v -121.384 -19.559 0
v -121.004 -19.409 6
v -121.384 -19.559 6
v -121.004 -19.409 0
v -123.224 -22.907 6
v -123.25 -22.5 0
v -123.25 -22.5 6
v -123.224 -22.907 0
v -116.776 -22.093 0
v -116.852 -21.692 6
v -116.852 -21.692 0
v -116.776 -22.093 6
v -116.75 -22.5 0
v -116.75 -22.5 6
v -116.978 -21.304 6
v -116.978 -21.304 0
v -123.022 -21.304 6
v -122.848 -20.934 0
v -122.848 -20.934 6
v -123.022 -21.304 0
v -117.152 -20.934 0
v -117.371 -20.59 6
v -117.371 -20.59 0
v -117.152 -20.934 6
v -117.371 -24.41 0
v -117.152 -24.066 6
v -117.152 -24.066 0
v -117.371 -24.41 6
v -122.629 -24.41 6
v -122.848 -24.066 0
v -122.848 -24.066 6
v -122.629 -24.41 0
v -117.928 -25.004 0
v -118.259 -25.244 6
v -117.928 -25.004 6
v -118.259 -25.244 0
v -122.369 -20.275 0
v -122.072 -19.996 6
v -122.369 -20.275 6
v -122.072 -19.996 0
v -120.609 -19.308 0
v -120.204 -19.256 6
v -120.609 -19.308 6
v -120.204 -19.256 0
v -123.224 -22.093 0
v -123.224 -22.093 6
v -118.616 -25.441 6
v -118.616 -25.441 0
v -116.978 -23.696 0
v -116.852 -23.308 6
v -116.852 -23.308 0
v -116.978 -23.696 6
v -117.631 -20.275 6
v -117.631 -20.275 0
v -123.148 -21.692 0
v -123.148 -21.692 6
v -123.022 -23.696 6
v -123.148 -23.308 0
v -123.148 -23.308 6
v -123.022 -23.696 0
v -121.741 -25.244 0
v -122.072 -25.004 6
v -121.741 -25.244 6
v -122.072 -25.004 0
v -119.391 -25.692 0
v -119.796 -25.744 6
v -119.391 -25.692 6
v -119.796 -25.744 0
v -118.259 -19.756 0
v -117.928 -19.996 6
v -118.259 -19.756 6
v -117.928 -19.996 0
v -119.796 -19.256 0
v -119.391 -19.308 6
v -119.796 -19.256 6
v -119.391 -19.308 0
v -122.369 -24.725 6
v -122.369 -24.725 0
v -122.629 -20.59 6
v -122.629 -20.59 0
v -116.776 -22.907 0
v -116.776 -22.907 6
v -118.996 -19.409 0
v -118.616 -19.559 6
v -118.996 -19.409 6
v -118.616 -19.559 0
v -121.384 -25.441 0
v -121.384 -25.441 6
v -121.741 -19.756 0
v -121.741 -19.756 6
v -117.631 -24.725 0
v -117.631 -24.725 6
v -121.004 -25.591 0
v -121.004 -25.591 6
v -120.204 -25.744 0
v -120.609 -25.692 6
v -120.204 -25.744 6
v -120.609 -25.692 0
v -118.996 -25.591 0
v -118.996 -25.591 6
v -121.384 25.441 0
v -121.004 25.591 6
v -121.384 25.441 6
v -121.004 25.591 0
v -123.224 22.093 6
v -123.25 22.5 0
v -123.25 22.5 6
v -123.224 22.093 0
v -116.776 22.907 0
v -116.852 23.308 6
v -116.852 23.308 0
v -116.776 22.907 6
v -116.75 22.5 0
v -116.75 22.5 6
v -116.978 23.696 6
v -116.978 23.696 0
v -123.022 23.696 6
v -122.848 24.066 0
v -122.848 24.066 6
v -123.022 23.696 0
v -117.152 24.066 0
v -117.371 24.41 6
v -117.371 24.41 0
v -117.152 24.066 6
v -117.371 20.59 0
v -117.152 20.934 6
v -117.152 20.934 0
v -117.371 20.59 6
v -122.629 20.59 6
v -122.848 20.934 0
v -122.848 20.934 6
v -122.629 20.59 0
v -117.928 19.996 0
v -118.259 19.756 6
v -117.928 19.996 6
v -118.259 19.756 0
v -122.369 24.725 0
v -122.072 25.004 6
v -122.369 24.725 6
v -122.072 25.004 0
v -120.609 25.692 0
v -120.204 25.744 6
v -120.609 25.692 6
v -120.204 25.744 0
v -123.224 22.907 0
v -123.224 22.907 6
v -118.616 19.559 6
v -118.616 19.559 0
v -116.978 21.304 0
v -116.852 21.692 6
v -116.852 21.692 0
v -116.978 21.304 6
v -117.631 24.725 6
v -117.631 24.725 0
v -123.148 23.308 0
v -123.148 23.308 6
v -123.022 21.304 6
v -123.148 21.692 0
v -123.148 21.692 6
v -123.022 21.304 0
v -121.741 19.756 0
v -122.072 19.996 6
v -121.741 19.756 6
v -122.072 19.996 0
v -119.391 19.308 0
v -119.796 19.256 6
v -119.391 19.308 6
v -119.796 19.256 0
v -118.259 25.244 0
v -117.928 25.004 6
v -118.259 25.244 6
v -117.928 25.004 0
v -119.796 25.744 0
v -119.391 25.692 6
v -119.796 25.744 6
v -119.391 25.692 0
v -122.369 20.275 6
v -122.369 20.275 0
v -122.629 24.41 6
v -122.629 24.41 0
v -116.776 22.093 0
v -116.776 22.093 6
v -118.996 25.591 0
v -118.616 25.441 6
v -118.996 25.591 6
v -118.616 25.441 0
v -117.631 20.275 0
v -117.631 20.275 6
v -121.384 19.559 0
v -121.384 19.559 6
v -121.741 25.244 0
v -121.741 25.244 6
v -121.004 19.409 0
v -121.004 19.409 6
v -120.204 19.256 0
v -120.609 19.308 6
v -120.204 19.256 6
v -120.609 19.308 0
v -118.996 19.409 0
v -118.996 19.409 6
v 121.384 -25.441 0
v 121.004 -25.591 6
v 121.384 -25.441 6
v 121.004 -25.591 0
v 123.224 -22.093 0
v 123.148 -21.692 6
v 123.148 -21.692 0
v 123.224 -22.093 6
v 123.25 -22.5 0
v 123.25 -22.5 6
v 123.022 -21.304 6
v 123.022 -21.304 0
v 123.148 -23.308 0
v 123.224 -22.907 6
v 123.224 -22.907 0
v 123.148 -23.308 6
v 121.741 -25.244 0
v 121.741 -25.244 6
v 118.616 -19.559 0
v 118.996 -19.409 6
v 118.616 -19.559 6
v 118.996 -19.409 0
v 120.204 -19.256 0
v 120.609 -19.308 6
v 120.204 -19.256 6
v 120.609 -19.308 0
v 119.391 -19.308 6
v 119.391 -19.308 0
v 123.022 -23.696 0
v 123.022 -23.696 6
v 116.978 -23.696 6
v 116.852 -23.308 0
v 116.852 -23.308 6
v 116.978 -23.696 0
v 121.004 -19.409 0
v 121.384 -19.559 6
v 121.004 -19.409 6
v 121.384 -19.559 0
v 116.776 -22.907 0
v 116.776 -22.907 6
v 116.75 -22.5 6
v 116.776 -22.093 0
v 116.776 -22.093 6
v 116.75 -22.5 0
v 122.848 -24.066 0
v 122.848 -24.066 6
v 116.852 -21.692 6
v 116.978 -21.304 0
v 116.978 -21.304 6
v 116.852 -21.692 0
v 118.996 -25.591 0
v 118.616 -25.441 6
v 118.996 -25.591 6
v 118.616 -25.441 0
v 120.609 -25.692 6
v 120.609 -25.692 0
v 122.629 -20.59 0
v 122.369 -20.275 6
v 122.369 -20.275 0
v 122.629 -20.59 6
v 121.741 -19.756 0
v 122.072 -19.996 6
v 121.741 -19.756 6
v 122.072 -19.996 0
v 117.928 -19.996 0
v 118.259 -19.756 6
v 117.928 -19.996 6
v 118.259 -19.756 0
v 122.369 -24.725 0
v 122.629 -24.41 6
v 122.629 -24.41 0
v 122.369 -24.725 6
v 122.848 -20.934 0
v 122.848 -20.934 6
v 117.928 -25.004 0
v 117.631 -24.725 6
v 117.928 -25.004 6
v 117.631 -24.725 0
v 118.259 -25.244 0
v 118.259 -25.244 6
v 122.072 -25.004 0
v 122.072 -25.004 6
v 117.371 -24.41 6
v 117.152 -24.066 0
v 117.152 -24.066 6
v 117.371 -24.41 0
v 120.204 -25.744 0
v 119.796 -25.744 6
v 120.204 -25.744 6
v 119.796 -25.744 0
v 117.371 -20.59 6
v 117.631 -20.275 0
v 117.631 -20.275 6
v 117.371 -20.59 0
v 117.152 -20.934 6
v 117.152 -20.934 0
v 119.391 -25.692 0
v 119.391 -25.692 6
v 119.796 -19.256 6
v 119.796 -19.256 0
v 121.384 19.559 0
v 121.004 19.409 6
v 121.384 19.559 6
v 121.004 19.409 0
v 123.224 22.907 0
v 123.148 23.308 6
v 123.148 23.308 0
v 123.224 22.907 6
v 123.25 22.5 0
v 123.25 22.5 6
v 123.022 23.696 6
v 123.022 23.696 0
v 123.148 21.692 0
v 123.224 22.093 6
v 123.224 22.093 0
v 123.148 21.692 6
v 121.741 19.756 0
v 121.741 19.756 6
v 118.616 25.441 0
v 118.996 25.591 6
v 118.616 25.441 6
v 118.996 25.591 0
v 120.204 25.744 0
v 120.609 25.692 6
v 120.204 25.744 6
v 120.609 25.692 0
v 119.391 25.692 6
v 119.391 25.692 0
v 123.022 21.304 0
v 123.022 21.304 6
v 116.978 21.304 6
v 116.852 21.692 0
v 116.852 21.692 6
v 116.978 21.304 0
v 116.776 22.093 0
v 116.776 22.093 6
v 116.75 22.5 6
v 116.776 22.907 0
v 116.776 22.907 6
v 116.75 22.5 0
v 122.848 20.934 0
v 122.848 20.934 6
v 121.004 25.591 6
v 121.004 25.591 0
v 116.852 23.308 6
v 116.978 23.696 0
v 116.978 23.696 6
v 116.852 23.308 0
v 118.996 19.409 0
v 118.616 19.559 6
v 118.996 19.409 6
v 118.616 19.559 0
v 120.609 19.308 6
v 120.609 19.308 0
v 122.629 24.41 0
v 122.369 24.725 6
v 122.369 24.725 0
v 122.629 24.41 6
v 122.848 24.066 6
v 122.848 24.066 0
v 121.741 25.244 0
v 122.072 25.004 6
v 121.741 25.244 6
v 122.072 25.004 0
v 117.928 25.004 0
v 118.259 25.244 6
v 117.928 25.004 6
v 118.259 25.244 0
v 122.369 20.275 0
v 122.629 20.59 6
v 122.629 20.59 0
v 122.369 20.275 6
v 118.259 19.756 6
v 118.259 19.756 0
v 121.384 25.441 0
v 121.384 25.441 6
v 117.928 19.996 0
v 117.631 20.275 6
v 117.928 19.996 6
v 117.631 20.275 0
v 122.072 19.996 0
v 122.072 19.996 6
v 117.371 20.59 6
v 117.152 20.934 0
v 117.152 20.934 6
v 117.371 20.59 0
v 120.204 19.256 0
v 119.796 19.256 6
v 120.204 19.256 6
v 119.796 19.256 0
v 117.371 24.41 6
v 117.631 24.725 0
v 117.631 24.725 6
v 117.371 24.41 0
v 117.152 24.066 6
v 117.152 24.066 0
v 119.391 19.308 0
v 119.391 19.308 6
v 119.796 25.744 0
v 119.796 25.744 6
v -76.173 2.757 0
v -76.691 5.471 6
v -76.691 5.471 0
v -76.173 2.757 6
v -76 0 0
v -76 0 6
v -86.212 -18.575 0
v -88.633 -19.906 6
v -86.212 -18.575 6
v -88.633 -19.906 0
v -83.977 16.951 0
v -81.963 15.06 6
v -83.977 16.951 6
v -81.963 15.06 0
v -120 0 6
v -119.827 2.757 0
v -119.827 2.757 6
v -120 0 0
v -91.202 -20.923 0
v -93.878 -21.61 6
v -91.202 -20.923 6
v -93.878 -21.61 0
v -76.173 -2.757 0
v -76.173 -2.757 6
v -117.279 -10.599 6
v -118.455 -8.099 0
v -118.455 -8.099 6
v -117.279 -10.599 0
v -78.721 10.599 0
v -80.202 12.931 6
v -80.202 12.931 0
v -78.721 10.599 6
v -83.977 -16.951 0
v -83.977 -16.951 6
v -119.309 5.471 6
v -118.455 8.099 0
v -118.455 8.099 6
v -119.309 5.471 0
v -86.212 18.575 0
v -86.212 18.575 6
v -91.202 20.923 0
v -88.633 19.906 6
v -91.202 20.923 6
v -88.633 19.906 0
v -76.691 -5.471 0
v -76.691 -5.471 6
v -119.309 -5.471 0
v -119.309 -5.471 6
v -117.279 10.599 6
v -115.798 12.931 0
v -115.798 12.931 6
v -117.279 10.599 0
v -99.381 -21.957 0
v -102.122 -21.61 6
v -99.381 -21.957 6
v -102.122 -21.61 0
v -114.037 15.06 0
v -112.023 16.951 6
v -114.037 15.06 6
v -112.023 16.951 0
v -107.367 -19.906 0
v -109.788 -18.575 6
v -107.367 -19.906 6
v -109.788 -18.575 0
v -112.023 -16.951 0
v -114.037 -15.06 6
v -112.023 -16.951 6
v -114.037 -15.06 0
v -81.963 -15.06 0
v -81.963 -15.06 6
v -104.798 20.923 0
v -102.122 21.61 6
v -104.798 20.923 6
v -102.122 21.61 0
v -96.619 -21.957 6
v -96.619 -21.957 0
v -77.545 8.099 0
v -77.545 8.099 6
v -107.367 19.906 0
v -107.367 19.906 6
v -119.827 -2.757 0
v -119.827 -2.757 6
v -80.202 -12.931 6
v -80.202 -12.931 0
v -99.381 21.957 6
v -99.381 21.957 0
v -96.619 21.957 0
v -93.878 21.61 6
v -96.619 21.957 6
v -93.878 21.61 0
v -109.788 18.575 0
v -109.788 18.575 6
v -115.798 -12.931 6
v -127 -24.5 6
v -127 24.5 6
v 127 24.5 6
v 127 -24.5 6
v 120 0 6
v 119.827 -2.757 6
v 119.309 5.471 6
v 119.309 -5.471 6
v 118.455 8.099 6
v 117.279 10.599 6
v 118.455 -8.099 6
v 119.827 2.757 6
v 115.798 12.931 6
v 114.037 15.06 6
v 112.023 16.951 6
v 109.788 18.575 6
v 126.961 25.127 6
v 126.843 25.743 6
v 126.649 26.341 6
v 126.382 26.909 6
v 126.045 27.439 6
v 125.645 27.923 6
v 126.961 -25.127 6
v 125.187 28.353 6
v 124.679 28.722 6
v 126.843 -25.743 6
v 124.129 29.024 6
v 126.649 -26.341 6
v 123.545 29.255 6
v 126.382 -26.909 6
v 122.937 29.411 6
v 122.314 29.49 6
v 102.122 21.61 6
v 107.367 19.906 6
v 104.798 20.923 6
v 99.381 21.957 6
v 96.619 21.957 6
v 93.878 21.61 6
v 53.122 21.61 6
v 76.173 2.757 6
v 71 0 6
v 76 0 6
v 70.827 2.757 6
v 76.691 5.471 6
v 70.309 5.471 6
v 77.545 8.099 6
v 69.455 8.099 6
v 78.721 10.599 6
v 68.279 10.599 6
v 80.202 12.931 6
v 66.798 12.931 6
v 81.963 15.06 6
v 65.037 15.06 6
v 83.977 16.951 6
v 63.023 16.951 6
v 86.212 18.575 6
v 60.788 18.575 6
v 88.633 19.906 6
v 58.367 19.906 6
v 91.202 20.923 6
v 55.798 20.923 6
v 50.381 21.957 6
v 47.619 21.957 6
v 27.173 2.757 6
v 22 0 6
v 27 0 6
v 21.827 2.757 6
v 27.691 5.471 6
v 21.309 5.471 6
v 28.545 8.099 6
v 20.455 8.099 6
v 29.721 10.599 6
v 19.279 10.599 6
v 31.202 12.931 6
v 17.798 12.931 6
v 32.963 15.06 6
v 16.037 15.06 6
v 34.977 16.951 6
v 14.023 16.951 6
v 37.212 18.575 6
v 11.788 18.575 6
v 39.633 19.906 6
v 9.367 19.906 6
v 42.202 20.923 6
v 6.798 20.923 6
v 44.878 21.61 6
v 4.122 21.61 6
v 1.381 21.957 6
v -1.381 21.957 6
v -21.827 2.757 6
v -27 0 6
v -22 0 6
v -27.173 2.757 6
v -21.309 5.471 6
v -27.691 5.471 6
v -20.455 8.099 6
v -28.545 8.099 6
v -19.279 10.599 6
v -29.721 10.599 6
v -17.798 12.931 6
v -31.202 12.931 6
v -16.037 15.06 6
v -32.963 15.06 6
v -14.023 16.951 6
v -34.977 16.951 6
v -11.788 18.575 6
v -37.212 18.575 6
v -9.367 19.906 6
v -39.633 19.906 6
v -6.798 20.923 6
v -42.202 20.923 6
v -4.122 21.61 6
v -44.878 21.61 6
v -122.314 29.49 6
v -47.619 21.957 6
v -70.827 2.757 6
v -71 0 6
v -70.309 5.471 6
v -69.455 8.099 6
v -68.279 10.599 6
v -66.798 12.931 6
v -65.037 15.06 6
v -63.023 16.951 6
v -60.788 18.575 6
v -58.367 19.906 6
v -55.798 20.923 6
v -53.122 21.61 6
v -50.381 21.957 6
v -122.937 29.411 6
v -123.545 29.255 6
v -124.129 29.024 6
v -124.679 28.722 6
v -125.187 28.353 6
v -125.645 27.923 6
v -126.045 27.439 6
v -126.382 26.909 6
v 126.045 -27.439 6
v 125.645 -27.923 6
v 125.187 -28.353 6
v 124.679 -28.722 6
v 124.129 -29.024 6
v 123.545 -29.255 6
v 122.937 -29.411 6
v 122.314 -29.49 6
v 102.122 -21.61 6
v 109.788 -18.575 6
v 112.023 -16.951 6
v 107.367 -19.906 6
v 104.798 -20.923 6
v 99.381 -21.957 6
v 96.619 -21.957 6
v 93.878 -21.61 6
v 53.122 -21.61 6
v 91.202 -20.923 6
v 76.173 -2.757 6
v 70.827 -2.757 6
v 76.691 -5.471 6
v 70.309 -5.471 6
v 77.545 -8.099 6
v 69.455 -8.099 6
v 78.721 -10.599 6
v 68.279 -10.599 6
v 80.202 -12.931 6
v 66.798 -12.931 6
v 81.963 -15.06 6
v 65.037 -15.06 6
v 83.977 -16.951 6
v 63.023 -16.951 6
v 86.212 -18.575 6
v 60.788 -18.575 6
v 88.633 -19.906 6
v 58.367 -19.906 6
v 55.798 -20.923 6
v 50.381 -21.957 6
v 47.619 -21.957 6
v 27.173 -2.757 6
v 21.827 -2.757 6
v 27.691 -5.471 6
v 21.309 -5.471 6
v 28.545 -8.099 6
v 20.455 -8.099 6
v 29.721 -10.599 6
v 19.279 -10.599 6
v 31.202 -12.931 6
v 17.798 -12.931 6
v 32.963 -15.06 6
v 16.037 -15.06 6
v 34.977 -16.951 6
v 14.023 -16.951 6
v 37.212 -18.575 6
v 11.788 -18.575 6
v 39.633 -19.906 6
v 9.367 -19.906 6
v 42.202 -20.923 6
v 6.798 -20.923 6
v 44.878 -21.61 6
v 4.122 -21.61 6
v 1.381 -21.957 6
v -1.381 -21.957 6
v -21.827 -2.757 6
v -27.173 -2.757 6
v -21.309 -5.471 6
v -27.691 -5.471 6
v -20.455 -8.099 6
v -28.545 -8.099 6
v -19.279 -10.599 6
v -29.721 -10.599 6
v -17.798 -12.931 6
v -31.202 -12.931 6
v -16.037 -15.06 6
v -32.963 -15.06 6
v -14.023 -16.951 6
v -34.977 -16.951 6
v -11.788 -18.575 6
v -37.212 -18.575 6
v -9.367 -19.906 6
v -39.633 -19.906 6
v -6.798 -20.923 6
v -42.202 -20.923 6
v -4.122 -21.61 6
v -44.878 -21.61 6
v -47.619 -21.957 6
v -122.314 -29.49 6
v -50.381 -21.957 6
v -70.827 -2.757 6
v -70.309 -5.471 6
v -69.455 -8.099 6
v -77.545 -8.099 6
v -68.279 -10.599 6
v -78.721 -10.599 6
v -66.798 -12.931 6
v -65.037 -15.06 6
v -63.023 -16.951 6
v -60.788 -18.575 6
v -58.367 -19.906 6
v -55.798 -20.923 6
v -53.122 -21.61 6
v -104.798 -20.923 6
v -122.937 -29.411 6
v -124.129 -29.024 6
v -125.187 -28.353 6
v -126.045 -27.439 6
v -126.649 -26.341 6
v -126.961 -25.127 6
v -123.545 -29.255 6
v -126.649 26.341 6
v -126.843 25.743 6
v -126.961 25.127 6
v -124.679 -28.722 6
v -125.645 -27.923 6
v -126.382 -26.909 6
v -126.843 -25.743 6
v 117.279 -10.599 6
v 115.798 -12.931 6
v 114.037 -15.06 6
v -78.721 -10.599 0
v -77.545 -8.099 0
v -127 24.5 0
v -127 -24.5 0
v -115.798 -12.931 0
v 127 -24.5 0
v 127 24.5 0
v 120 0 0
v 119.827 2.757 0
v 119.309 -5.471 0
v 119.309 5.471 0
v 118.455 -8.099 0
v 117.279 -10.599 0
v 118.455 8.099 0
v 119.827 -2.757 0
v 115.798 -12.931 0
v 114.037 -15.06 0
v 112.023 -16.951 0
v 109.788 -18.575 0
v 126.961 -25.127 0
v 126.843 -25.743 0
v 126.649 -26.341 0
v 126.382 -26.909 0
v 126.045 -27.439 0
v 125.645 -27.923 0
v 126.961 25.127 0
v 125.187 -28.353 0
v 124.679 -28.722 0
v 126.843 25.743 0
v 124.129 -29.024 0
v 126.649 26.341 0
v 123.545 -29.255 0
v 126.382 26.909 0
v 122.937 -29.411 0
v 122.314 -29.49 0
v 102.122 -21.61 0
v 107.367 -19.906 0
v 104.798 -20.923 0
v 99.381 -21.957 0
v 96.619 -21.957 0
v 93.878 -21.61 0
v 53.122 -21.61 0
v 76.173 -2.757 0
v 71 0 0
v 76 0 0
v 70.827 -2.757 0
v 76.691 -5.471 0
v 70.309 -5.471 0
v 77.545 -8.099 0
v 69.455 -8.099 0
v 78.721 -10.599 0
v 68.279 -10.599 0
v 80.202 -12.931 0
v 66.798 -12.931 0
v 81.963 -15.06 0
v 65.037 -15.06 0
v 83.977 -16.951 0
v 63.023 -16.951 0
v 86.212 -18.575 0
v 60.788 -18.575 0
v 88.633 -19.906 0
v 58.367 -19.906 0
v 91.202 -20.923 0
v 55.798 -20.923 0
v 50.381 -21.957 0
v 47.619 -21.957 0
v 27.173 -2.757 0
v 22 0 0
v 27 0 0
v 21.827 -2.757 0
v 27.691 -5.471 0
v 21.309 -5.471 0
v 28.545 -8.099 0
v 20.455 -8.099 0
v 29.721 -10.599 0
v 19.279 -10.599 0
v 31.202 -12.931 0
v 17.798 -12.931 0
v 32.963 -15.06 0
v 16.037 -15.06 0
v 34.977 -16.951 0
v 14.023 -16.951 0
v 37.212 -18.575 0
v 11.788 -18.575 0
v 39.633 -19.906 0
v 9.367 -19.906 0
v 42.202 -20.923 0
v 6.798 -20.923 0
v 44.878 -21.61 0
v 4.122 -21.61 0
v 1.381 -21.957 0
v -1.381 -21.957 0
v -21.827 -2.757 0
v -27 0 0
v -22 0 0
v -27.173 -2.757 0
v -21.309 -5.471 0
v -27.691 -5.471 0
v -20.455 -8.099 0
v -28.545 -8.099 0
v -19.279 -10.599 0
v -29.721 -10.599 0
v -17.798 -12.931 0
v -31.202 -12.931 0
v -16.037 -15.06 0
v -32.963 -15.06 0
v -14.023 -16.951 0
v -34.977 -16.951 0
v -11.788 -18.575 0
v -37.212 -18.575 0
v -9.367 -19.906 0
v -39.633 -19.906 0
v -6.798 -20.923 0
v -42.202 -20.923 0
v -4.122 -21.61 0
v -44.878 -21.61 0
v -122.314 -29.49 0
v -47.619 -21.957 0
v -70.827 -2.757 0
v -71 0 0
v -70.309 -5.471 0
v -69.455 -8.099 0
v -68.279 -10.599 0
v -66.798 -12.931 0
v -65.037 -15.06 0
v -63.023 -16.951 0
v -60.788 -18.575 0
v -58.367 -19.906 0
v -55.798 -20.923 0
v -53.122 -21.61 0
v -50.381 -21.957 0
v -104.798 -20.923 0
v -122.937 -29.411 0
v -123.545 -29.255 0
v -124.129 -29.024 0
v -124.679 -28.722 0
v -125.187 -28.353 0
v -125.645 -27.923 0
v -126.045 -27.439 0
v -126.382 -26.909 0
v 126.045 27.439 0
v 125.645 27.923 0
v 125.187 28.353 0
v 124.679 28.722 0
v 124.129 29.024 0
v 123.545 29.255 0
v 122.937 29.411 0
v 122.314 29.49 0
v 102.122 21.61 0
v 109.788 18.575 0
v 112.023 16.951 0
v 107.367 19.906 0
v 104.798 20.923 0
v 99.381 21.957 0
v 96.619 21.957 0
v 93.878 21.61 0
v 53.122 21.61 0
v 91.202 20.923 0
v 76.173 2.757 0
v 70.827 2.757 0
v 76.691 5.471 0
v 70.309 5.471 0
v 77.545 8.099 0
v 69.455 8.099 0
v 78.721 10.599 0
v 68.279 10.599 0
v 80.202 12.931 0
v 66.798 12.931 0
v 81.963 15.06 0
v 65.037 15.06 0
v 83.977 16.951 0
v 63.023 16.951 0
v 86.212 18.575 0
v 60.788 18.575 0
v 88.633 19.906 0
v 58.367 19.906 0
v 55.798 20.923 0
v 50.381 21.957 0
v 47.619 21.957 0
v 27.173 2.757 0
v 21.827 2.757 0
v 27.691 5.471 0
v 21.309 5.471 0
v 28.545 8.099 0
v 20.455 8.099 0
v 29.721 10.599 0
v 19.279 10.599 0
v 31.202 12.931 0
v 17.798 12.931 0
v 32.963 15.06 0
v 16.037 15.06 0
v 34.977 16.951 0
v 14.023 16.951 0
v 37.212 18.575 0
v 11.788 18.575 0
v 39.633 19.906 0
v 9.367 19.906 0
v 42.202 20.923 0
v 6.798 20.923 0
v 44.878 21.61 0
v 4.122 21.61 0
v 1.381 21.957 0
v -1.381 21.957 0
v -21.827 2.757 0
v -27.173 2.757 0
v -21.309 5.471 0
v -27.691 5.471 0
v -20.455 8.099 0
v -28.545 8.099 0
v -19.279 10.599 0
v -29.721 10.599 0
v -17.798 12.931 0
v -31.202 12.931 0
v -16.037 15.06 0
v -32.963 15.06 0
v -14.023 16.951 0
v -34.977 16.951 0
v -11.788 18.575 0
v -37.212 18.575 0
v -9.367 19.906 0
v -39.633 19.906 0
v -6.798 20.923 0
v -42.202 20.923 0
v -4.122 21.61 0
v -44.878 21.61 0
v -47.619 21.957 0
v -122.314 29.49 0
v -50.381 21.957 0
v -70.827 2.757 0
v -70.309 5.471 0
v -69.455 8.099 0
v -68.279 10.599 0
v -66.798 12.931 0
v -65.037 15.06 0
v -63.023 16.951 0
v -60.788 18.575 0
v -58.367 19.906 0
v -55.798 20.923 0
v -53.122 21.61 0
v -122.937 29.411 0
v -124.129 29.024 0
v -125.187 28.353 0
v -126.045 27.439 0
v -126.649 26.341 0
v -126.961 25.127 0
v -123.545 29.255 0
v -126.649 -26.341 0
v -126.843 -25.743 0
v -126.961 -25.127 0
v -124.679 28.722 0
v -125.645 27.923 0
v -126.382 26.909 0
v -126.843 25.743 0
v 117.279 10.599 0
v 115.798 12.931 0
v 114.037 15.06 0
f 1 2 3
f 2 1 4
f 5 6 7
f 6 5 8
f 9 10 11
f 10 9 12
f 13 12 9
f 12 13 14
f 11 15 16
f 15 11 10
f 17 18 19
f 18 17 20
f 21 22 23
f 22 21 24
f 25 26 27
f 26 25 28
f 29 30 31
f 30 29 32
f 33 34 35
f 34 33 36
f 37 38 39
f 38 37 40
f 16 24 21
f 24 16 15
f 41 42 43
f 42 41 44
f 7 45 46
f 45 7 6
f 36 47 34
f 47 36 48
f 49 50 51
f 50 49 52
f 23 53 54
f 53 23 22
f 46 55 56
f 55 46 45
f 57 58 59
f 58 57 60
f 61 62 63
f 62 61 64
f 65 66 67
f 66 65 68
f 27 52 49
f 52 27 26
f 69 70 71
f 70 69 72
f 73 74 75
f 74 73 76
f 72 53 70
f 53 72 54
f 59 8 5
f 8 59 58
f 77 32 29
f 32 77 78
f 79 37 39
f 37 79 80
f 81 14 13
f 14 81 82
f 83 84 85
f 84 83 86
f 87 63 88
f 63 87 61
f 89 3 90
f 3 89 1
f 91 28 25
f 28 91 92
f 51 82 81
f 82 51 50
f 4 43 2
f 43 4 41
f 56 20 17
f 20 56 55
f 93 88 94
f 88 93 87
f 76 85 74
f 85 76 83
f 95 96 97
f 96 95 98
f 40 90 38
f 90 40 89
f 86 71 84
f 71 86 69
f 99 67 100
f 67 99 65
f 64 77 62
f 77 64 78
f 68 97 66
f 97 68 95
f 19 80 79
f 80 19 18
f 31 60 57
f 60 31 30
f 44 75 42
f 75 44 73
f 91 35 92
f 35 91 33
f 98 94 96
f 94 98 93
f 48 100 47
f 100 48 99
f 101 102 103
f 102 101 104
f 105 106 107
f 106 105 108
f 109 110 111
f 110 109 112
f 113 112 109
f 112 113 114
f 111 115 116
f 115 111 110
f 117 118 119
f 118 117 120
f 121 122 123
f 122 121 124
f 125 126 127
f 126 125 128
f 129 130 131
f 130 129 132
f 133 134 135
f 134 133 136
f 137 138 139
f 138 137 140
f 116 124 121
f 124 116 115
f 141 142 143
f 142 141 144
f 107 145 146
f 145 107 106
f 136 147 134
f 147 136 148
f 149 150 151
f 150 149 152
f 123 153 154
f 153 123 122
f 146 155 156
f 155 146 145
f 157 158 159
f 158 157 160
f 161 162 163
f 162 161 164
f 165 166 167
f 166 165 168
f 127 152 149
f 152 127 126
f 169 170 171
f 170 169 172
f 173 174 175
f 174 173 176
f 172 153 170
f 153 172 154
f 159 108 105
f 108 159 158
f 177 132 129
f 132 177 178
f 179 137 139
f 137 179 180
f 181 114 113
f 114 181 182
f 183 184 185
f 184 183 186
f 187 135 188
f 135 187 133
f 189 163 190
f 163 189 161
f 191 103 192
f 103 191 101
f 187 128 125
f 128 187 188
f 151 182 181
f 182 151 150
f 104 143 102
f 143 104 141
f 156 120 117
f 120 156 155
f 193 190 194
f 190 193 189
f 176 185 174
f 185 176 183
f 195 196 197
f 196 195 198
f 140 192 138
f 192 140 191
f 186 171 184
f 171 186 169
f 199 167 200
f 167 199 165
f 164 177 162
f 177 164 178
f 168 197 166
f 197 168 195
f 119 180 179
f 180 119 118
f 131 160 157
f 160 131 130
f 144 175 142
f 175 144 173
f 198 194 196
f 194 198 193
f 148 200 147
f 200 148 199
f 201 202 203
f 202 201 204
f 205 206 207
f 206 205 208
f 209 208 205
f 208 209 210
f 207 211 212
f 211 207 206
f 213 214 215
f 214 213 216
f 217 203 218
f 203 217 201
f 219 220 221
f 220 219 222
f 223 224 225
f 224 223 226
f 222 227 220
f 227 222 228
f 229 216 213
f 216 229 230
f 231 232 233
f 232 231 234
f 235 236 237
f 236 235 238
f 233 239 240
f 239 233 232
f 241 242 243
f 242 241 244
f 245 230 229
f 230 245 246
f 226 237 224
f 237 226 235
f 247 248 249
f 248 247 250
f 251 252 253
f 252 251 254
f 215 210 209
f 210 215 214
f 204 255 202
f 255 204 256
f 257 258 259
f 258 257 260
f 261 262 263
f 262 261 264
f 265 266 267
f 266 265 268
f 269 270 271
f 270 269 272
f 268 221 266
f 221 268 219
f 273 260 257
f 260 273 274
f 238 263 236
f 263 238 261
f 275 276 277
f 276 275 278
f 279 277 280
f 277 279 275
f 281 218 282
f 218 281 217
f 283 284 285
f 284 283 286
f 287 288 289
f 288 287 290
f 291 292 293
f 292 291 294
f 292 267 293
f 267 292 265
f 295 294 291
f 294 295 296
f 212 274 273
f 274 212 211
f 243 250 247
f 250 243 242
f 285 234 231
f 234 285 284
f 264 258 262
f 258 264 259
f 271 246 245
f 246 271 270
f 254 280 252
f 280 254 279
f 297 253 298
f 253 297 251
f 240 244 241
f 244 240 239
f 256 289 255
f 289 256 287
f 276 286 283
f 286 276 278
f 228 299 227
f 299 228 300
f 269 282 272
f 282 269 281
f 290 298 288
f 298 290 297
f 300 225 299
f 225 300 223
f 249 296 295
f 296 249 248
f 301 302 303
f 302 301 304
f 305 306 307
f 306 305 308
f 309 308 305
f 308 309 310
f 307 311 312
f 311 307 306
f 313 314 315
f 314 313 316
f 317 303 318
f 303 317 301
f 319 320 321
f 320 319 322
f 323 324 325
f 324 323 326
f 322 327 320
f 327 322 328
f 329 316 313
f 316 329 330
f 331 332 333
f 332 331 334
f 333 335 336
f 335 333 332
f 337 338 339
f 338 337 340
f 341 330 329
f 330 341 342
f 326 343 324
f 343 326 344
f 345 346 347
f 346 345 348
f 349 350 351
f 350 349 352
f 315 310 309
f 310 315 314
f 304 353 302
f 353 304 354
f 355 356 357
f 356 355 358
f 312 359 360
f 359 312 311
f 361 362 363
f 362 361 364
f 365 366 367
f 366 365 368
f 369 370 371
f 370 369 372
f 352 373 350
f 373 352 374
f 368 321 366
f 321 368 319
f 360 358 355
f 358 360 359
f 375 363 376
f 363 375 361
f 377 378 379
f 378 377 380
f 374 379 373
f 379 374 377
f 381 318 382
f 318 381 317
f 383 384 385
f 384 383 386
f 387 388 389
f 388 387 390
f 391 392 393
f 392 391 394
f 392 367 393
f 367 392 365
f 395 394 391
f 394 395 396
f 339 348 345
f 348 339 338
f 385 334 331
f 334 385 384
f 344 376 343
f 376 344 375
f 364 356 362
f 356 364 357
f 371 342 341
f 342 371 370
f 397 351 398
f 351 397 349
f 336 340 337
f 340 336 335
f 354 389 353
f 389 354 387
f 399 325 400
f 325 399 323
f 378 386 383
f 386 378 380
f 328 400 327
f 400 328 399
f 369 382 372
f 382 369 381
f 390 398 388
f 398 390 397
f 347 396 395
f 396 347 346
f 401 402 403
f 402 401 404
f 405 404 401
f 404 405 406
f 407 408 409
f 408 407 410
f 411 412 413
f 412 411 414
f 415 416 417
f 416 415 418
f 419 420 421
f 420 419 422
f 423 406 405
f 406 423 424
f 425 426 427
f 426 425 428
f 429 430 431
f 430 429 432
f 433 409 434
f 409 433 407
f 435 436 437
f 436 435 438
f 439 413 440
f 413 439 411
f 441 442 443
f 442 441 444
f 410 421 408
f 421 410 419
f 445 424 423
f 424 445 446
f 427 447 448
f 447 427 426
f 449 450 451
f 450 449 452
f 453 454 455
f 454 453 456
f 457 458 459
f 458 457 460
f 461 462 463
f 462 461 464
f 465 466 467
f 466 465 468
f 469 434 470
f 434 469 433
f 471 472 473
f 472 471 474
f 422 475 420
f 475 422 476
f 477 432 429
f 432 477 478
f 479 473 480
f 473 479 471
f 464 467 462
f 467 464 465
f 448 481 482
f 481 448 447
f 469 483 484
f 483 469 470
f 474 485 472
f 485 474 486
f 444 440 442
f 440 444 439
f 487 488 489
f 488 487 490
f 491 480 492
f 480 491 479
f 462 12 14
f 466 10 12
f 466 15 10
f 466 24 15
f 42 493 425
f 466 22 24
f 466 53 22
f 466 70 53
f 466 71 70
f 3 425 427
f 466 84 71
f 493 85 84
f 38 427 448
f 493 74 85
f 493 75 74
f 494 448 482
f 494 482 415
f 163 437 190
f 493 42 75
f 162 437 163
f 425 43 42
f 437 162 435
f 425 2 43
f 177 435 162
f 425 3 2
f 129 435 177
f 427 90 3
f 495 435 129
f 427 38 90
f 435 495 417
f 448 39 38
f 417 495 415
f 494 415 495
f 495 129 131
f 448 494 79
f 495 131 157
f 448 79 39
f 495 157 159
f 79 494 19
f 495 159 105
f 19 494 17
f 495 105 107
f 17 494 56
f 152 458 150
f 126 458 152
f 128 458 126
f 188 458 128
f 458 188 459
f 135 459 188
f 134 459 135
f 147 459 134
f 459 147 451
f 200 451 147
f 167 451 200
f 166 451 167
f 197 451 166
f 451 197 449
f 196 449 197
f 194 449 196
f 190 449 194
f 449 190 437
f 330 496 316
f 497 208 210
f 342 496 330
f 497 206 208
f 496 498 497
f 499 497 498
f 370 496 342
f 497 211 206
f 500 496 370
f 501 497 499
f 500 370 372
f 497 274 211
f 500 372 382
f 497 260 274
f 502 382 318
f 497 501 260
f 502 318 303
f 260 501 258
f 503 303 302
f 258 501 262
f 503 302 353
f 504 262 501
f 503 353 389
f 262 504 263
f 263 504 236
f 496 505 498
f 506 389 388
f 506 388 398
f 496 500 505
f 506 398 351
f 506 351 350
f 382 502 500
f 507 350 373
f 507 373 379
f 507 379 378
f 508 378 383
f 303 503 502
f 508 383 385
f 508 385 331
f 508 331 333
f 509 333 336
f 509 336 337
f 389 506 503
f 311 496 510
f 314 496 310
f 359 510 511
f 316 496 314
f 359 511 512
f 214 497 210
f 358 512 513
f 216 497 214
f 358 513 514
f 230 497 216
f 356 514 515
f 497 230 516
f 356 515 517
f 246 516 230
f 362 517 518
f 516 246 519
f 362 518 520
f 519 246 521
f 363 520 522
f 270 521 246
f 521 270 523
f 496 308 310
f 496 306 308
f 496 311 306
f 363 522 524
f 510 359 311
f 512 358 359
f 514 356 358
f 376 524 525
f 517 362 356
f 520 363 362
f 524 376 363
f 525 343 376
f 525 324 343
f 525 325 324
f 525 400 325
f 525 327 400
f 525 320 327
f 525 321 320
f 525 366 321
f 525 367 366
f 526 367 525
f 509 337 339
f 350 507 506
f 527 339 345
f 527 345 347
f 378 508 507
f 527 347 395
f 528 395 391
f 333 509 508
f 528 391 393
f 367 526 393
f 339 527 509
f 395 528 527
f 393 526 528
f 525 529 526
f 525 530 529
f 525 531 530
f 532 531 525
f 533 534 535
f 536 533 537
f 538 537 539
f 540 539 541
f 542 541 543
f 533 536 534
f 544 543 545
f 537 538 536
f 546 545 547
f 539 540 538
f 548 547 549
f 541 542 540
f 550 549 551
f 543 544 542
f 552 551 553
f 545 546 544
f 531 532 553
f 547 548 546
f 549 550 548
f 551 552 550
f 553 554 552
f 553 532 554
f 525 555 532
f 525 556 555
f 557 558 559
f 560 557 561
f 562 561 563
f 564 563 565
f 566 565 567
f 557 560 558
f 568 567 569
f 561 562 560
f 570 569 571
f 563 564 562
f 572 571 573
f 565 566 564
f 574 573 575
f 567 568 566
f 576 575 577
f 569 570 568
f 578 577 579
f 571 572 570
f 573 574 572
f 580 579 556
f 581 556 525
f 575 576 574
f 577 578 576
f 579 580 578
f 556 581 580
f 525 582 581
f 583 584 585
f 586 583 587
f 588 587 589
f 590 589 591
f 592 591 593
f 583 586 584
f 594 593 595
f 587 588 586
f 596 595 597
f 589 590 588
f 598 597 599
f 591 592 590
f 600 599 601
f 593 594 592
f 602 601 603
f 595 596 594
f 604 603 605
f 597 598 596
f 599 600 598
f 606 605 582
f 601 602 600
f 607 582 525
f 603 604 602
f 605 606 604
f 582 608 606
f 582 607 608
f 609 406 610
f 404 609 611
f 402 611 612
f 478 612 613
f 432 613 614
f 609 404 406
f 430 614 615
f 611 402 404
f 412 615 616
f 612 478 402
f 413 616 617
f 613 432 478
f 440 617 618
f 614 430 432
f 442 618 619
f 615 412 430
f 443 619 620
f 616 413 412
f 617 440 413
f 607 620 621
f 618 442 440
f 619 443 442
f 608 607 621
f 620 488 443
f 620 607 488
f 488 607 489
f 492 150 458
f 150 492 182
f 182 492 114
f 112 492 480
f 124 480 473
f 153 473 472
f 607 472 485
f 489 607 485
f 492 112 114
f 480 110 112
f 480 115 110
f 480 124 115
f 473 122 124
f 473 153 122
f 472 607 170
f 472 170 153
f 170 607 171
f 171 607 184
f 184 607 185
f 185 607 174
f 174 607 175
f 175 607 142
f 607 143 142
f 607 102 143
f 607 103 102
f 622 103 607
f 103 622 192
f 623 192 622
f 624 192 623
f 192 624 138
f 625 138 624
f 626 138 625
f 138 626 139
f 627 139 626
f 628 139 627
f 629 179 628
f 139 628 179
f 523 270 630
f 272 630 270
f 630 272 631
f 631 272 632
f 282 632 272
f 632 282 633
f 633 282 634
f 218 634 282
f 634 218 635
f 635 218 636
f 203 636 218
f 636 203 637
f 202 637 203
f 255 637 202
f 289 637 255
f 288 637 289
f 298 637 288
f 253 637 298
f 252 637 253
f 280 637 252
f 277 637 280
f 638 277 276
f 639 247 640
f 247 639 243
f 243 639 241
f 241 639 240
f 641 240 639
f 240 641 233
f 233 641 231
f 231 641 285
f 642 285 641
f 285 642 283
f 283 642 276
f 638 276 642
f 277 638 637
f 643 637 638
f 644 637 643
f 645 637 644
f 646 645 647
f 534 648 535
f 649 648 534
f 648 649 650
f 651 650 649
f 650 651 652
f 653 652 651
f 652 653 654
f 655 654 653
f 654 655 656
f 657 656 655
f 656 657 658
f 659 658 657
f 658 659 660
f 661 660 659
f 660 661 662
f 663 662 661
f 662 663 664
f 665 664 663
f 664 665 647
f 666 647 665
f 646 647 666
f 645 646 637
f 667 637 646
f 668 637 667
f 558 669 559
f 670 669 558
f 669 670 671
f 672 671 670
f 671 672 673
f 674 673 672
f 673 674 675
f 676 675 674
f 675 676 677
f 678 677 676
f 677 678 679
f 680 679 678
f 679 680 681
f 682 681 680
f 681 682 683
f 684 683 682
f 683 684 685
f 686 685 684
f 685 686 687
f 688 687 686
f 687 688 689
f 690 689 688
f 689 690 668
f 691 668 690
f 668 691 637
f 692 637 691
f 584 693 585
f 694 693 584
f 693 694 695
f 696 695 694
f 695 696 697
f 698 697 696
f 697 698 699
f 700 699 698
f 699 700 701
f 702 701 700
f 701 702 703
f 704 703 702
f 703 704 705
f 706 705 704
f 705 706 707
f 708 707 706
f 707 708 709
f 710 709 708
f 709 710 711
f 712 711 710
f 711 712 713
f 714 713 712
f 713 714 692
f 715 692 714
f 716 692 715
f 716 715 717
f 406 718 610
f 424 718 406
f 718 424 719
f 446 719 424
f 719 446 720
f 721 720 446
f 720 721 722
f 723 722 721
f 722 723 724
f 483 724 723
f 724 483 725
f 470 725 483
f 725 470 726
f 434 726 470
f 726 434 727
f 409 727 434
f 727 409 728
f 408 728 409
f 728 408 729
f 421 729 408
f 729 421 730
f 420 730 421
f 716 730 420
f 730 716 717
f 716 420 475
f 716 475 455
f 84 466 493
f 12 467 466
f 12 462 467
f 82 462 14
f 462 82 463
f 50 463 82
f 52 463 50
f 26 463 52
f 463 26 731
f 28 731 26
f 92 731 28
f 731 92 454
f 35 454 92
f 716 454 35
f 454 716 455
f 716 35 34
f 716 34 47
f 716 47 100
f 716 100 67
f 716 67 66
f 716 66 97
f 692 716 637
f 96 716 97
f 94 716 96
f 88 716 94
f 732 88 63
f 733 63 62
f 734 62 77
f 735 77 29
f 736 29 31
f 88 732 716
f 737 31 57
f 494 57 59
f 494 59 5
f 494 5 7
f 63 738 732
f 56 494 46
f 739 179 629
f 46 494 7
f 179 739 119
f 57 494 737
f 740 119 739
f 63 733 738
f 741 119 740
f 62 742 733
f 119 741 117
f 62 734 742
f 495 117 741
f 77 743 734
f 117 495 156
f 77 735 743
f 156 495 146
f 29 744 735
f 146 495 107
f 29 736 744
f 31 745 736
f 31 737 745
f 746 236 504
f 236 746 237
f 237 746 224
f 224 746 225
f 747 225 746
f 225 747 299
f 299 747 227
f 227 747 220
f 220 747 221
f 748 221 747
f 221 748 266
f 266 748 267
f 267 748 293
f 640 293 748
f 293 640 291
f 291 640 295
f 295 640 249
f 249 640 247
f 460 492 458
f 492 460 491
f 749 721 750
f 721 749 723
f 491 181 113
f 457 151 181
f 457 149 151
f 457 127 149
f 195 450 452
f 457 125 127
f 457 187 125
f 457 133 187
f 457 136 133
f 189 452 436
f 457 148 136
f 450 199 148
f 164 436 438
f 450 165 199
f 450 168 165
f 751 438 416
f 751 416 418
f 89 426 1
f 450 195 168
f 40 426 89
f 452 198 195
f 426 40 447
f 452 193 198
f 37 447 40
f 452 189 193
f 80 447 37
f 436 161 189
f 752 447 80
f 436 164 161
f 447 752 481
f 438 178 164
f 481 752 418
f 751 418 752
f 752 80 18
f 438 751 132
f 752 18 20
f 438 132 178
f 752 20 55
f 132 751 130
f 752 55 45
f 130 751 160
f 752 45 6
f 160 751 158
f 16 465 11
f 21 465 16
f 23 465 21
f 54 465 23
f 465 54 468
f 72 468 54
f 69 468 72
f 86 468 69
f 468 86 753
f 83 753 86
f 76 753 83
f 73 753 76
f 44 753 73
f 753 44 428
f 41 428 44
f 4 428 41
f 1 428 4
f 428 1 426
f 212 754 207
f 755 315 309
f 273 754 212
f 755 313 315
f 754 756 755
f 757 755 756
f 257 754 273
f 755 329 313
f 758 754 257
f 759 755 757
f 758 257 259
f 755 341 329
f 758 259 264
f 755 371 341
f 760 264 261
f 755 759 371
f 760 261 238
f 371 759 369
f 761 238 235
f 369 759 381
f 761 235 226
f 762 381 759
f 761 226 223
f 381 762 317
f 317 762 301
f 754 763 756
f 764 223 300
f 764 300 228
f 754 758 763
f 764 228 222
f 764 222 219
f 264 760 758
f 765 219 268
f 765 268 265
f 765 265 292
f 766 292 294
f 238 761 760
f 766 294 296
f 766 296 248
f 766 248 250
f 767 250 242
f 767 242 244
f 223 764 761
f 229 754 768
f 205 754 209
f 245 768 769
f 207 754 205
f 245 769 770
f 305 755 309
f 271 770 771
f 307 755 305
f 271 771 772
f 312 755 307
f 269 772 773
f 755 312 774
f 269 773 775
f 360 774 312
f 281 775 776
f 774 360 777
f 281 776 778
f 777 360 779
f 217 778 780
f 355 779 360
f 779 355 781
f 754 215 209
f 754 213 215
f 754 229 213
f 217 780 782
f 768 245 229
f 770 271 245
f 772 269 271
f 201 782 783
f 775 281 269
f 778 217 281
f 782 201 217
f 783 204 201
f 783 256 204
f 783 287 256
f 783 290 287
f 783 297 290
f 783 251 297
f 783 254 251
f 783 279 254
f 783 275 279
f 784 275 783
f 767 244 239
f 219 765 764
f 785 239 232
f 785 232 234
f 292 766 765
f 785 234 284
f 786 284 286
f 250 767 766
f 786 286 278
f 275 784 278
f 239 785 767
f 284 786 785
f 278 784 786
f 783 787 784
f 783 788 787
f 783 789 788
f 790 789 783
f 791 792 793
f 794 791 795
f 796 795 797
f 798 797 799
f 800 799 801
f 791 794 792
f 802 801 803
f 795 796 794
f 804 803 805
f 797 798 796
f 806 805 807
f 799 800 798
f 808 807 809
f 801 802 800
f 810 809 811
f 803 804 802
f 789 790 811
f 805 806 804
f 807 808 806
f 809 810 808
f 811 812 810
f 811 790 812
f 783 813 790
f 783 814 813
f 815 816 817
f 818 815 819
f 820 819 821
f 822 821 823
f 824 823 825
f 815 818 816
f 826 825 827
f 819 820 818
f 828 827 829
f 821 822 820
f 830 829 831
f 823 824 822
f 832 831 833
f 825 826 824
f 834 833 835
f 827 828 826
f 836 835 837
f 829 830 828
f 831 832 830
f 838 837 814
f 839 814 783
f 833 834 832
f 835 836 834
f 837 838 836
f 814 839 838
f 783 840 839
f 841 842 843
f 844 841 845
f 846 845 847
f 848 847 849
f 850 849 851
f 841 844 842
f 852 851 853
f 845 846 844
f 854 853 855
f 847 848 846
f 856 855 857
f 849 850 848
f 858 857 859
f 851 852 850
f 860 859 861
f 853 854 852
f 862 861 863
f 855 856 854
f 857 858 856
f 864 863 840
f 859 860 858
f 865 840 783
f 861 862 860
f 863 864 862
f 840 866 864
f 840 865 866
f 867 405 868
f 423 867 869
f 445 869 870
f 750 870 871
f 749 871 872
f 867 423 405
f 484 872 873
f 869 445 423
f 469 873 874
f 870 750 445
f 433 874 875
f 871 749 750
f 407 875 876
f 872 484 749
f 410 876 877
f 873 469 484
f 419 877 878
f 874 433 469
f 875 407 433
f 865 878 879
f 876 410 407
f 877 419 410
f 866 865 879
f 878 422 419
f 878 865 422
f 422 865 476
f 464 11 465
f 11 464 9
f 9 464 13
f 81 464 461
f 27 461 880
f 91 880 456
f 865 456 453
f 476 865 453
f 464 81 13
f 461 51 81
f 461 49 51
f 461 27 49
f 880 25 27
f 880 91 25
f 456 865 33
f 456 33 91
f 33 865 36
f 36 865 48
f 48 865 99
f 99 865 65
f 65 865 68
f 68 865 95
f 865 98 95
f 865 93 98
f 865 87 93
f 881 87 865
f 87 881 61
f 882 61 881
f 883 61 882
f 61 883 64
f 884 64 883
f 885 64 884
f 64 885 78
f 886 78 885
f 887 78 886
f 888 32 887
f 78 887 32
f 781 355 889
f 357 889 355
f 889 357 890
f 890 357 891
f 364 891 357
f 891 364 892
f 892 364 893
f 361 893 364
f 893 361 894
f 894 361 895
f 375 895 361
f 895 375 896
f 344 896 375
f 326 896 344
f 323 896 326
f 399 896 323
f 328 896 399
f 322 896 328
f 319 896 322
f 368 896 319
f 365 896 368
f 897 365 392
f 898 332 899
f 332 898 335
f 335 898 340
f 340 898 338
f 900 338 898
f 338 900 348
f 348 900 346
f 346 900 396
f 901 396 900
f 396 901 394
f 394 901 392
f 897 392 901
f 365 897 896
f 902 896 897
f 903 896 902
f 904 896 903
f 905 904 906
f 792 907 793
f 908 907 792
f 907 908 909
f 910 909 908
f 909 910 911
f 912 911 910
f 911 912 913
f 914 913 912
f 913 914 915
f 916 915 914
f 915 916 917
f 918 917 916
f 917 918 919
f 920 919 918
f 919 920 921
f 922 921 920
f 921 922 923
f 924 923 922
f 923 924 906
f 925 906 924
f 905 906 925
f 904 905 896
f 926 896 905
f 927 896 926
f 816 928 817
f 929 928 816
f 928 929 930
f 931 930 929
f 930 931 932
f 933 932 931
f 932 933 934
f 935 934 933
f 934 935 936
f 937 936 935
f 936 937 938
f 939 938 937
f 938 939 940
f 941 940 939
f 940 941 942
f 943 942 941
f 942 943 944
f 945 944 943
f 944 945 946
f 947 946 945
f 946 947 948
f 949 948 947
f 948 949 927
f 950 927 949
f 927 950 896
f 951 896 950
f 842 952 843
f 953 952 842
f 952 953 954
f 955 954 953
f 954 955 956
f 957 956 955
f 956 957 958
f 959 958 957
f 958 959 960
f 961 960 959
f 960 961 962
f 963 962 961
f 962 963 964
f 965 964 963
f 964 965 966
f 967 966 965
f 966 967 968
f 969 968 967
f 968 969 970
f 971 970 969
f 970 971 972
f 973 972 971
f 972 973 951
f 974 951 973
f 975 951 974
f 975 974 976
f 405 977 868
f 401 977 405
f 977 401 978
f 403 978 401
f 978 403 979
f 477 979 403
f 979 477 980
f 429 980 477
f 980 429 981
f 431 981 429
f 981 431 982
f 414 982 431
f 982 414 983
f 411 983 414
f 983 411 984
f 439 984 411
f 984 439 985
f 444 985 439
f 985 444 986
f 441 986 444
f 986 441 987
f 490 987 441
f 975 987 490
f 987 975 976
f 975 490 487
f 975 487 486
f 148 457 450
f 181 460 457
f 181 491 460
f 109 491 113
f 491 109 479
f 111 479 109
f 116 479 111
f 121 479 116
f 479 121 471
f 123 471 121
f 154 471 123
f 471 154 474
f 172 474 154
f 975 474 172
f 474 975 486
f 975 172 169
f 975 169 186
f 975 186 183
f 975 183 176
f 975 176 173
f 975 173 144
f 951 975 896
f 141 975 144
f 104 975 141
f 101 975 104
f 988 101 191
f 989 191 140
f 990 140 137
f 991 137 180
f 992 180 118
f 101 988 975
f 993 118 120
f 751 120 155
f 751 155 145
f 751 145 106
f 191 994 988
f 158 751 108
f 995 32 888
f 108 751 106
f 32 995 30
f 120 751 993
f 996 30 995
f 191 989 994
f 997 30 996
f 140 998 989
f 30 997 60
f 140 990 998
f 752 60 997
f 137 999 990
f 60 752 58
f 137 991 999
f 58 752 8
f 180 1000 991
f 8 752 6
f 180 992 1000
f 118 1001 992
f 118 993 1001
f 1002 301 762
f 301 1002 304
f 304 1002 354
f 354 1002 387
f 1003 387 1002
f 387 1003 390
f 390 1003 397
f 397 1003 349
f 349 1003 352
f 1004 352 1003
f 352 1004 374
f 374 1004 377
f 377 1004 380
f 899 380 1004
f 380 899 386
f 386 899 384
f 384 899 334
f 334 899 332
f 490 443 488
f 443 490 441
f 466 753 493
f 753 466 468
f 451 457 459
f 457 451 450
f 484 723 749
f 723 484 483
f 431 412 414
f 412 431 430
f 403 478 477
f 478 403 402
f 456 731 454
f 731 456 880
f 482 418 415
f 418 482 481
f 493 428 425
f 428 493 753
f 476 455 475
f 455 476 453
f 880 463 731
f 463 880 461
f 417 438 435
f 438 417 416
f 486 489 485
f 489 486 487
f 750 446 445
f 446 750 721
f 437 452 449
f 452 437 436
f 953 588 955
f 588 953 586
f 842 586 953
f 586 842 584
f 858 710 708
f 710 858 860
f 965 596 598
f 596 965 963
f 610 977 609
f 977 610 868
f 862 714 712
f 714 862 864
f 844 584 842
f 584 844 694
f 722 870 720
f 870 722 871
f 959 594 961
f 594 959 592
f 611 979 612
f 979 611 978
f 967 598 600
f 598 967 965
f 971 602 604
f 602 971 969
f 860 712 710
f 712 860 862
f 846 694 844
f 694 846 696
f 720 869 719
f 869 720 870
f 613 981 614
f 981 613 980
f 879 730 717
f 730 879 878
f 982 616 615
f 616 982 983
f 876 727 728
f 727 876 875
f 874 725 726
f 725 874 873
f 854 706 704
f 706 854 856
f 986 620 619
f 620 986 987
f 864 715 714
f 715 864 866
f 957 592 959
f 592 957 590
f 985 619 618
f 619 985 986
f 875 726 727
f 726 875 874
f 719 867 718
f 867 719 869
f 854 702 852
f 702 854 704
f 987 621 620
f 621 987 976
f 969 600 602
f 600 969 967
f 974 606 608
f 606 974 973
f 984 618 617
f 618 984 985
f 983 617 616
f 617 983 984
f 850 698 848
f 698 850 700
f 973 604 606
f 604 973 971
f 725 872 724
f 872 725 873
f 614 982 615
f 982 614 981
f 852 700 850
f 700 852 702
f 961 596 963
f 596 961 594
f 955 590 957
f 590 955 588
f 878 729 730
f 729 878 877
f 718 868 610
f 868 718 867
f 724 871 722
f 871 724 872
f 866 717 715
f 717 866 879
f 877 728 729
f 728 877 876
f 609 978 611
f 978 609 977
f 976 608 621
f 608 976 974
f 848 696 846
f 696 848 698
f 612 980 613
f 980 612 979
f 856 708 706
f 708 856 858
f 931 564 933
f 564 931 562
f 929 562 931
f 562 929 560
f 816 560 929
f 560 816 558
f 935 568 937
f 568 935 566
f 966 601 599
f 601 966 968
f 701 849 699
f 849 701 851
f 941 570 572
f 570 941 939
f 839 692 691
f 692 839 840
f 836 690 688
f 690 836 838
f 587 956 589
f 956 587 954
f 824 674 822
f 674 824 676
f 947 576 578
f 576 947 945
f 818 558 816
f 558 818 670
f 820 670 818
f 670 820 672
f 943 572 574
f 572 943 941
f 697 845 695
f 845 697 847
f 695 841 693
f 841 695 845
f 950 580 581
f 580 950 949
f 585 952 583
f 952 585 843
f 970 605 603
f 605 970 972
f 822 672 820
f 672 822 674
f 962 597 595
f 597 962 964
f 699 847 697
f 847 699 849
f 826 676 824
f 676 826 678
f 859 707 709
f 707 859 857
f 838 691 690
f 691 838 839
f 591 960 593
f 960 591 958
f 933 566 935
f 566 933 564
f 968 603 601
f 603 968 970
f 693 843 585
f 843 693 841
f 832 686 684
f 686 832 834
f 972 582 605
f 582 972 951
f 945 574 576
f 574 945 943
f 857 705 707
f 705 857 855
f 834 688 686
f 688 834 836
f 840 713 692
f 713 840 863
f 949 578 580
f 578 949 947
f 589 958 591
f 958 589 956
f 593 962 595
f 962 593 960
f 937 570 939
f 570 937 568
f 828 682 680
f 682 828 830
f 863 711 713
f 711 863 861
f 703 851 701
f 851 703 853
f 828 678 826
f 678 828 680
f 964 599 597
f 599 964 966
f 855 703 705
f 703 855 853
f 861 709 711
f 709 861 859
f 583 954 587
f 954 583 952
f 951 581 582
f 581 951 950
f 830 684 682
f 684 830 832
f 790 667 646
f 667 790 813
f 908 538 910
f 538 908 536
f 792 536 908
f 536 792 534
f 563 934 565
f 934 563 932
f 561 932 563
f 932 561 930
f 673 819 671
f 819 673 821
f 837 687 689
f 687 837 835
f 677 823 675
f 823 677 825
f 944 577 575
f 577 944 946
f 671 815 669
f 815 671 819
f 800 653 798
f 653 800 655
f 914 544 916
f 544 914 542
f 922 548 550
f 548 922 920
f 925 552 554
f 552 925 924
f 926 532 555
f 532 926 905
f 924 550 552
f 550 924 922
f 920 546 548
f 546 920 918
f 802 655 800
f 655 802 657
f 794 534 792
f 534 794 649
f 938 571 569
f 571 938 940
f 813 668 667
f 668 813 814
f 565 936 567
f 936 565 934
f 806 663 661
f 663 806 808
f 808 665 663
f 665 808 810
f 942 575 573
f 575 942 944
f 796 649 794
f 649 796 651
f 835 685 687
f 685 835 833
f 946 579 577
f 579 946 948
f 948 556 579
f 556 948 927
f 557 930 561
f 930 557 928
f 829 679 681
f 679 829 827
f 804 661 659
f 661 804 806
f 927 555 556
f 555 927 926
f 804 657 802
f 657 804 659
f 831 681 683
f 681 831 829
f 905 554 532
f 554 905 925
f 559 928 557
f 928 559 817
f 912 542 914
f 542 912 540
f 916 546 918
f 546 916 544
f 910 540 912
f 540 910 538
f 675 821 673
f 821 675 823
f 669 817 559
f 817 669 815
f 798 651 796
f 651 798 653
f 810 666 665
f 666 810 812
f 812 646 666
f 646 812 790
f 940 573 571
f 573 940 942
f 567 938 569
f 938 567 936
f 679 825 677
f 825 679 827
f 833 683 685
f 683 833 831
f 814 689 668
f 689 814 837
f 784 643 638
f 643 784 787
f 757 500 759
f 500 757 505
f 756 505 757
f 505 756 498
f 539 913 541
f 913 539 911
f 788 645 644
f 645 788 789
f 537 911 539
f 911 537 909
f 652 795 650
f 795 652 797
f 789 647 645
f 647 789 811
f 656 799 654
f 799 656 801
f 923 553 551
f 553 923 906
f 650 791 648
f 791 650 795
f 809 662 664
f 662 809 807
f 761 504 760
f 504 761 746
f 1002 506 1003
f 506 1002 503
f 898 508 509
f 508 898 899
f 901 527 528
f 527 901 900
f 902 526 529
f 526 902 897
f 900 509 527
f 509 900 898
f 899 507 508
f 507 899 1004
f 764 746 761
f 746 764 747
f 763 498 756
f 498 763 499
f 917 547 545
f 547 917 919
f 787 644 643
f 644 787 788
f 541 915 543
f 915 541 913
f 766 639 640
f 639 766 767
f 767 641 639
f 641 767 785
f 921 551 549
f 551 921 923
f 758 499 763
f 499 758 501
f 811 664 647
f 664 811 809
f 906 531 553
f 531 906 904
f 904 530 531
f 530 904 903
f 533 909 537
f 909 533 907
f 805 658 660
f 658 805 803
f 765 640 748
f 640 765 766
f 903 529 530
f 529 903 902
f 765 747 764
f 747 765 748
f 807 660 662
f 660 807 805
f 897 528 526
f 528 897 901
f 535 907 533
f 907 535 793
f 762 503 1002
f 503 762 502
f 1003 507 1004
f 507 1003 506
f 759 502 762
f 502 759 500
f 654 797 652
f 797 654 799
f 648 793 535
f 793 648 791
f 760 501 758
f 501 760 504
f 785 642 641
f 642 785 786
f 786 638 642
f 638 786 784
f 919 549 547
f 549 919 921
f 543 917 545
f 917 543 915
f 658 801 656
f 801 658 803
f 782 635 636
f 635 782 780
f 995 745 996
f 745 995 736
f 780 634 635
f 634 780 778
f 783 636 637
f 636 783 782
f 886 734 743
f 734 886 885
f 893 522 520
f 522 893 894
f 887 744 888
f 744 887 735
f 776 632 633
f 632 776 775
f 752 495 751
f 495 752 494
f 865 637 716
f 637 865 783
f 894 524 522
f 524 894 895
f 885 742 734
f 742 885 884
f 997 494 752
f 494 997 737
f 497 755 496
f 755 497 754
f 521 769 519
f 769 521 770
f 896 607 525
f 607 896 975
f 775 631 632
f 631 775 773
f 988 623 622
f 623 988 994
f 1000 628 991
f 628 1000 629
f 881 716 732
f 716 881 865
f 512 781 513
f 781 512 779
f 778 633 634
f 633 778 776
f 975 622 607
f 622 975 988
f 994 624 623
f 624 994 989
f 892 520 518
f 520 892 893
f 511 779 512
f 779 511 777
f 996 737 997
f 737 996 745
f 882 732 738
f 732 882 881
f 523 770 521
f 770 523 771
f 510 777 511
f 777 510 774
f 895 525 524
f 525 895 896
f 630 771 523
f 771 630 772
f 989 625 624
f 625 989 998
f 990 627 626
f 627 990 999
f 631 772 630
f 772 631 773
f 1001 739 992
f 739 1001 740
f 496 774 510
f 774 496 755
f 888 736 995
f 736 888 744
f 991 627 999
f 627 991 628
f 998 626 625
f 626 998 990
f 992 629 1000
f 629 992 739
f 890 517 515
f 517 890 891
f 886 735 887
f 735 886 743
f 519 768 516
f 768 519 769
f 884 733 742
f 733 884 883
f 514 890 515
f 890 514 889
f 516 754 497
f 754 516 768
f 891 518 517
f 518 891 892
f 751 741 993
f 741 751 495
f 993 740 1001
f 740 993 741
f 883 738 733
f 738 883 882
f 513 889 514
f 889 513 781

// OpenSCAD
$fn = 50;


difference() {
	union() {
		hull() {
			translate(v = [-122.0000000000, 24.5000000000, 0]) {
				cylinder(h = 6, r = 5);
			}
			translate(v = [122.0000000000, 24.5000000000, 0]) {
				cylinder(h = 6, r = 5);
			}
			translate(v = [-122.0000000000, -24.5000000000, 0]) {
				cylinder(h = 6, r = 5);
			}
			translate(v = [122.0000000000, -24.5000000000, 0]) {
				cylinder(h = 6, r = 5);
			}
		}
	}
	union() {
		#translate(v = [-120.0000000000, -22.5000000000, -100.0000000000]) {
			cylinder(h = 200, r = 3.2500000000);
		}
		#translate(v = [-120.0000000000, 22.5000000000, -100.0000000000]) {
			cylinder(h = 200, r = 3.2500000000);
		}
		#translate(v = [120.0000000000, -22.5000000000, -100.0000000000]) {
			cylinder(h = 200, r = 3.2500000000);
		}
		#translate(v = [120.0000000000, 22.5000000000, -100.0000000000]) {
			cylinder(h = 200, r = 3.2500000000);
		}
		#translate(v = [-98.0000000000, 0, 0]) {
			cylinder(h = 6, r = 22.0000000000);
		}
		#translate(v = [-49.0000000000, 0, 0]) {
			cylinder(h = 6, r = 22.0000000000);
		}
		#cylinder(h = 6, r = 22.0000000000);
		#translate(v = [49.0000000000, 0, 0]) {
			cylinder(h = 6, r = 22.0000000000);
		}
		#translate(v = [98.0000000000, 0, 0]) {
			cylinder(h = 6, r = 22.0000000000);
		}
	}
}
